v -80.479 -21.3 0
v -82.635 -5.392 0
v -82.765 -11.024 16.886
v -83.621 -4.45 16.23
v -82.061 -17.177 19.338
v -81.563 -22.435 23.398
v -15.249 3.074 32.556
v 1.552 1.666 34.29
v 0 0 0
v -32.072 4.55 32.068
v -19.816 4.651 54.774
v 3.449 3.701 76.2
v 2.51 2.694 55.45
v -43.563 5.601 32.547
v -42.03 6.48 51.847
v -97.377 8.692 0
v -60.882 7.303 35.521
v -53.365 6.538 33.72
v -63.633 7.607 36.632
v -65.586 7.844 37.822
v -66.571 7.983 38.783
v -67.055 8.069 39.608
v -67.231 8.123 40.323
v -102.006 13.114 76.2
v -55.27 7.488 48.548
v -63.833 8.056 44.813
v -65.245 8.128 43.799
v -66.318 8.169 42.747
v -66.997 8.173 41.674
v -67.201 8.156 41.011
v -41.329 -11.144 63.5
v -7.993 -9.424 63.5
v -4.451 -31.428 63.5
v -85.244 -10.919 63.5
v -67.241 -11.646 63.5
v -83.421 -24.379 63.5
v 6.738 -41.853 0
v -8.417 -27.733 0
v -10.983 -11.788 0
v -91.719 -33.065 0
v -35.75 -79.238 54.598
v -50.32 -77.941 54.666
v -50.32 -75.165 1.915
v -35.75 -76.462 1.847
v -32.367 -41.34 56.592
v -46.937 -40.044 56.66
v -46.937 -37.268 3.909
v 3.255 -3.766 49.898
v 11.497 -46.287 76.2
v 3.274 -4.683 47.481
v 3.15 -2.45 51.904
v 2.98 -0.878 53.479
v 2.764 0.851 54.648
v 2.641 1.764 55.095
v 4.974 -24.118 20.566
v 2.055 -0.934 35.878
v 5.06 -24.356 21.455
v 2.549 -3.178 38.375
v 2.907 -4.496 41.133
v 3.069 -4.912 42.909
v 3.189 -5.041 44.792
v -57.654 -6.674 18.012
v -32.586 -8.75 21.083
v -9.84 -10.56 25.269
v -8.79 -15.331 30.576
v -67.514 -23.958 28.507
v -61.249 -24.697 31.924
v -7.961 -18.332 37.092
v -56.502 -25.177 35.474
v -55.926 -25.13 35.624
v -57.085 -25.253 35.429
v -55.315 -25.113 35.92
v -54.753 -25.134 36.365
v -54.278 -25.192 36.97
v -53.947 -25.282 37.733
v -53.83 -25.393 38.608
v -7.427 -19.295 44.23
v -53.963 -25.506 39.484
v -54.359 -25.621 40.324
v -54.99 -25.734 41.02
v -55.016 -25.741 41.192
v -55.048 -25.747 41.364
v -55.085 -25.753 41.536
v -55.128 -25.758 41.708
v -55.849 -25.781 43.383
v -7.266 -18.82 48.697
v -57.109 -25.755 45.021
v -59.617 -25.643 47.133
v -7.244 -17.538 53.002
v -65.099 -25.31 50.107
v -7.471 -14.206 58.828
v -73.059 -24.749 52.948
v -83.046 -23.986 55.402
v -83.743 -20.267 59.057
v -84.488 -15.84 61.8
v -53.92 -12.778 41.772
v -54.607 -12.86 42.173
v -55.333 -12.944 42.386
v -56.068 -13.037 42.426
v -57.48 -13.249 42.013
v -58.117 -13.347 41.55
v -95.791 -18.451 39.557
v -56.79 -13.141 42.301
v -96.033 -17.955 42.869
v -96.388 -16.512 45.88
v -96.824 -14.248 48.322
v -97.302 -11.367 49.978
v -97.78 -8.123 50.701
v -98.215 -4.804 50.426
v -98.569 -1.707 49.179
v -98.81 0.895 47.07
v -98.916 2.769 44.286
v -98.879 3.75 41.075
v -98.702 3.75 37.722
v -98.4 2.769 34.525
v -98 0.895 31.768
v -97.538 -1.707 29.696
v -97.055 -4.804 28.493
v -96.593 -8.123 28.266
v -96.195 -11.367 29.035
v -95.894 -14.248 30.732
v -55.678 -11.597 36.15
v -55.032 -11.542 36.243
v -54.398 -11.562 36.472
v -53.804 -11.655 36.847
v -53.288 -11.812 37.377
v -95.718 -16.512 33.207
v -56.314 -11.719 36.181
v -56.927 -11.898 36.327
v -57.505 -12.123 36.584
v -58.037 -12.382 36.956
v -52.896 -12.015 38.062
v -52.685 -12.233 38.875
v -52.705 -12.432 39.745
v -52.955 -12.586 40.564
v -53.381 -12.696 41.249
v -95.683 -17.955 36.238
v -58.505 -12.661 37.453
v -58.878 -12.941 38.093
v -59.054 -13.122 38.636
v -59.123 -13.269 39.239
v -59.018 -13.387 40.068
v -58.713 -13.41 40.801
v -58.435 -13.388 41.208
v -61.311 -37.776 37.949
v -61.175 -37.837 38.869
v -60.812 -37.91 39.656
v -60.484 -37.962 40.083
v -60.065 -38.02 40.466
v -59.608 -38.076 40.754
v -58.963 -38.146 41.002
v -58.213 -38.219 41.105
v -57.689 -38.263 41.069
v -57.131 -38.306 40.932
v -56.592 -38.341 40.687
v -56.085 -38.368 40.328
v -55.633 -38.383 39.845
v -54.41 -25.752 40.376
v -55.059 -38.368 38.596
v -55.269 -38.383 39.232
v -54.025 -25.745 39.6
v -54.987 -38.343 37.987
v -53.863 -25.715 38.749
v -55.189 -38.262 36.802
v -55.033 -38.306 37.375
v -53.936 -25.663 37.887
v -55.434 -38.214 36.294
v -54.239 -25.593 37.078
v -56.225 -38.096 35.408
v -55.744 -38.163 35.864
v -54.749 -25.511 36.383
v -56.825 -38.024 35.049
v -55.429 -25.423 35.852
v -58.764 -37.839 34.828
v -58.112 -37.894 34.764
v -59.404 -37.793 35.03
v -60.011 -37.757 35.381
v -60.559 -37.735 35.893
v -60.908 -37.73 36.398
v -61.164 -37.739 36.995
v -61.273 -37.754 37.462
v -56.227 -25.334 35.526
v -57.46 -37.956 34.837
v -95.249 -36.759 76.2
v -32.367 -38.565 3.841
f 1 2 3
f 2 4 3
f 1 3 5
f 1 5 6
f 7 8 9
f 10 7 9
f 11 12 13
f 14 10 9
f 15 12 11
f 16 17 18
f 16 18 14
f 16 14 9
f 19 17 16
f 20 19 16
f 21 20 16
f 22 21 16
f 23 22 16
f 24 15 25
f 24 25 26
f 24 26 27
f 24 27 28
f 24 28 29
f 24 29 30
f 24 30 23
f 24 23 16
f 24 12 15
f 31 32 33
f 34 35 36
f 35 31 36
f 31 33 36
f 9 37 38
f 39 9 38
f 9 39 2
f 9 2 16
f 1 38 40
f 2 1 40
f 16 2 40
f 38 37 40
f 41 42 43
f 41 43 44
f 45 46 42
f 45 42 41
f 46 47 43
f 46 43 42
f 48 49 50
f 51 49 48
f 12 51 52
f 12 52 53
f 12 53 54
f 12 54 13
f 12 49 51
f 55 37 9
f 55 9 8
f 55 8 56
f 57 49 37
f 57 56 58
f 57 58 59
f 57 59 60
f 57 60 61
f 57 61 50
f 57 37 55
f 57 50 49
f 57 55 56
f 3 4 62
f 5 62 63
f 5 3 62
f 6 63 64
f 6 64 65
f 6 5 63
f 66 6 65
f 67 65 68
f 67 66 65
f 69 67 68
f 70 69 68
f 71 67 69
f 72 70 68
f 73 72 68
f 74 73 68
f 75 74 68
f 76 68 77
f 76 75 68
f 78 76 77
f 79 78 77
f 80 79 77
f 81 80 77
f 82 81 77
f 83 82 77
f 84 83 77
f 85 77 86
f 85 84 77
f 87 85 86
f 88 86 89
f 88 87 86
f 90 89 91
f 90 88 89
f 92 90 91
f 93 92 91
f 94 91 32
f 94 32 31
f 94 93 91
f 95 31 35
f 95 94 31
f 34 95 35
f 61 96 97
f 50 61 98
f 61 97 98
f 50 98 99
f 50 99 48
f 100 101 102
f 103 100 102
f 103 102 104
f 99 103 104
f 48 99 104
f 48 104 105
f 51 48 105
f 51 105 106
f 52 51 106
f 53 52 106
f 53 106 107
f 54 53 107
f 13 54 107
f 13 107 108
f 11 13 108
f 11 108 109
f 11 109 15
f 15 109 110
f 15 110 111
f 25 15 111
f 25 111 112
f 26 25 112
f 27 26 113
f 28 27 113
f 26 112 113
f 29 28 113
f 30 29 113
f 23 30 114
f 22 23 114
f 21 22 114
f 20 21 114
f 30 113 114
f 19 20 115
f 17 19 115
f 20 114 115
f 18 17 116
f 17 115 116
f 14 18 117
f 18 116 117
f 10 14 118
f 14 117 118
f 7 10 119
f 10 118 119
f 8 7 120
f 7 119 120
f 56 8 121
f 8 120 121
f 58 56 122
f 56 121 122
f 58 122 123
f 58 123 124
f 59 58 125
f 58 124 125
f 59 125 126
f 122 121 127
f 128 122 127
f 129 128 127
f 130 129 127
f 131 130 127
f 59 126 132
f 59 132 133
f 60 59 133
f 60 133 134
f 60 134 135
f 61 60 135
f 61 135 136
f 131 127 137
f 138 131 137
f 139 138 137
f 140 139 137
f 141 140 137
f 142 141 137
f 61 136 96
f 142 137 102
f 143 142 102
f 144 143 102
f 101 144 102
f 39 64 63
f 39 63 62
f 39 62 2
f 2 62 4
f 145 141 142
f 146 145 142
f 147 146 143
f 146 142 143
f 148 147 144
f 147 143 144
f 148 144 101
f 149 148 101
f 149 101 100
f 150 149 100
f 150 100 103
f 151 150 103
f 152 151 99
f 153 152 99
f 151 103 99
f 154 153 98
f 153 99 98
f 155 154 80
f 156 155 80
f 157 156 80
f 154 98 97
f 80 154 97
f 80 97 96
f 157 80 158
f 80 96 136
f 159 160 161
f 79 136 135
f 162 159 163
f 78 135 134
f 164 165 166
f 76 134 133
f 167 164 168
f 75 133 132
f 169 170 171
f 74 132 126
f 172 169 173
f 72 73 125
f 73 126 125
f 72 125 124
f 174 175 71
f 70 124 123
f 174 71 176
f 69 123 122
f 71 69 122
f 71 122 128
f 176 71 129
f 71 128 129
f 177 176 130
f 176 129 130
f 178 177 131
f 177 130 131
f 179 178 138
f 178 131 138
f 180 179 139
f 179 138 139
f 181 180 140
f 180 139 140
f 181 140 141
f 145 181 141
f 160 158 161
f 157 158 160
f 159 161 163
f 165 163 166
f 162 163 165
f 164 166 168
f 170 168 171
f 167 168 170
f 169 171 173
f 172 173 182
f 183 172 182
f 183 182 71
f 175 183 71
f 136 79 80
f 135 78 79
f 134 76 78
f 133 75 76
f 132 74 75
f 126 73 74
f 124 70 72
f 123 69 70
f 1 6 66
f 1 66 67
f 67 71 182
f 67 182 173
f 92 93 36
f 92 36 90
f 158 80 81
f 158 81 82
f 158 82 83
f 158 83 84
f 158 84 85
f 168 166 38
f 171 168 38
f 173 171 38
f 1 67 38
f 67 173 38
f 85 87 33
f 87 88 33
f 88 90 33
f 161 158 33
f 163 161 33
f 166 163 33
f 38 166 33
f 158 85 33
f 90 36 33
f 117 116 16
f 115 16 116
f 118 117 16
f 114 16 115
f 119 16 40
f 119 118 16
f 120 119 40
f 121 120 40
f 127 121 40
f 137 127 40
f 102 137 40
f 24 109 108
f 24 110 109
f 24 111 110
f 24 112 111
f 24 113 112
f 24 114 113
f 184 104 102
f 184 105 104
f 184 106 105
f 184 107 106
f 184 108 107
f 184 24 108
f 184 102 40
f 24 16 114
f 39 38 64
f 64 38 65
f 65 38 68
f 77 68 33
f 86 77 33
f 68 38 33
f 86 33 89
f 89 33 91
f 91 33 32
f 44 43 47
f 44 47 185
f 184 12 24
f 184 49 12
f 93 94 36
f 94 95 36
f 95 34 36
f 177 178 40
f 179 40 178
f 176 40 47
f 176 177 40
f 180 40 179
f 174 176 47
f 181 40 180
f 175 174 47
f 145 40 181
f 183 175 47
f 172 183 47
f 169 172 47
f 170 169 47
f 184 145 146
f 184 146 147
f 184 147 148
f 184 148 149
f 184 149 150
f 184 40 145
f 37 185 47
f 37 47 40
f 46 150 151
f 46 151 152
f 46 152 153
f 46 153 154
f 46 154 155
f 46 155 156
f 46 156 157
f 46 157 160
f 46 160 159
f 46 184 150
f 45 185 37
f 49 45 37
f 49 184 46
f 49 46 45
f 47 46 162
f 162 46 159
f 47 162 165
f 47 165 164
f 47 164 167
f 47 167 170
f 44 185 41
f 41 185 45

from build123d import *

# Parameters (mm, degrees)
F1_DEPTH = 76.2
F1_TAPER = -3
F2_R     = 11.2646539413
F3_DEPTH = 127
F4_T     = -12.7
F5_D     = 6.35
F6_W     = 14.6276317537
F6_H     = 52.8245866299
F8_DEPTH = 38.1


with BuildPart() as f1:
    # F0 (on Top) → F1 (new body)
    with BuildSketch(Plane.XY):
        Polygon((0, 0), (-97.3766073585, 8.691851981), (-91.719087719, -33.0650627753), (6.7379414104, -41.8533533812), align=None)
    extrude(amount=F1_DEPTH, taper=F1_TAPER)

    # F2 (on face) → F3 (cut)
    with BuildSketch(Plane(origin=(-94.2061631176, -12.7637116177, -4.9822445688), x_dir=(0.1338892143, -0.9909710079, 0.0070809466), z_dir=(-0.9895880386, -0.1340763271, -0.0523359562))):
        with Locations((-5.5252215825, 44.5609055459)):
            Circle(F2_R)
    extrude(amount=-F3_DEPTH, mode=Mode.SUBTRACT)

    # F4
    f4_openings = [f1.faces().sort_by_distance(p)[0] for p in [
        (-45.58374, -16.595081, 0),
    ]]
    offset(amount=F4_T, openings=f4_openings)

    # F5 (through all)
    with Locations(Plane(origin=(-3.6430423813, -40.8137538844, -2.1474622433), x_dir=(0.9960508275, -0.088662203, -0.004665063), z_dir=(-0.088784847, -0.9946749211, -0.0523359562))):
        with Locations((-54.7213628888, 39.8817788885)):
            Hole(F5_D / 2)

    # F6 (on face) → F8 (join)
    with BuildSketch(Plane(origin=(-3.6430423813, -40.8137538844, -2.1474622433), x_dir=(0.9960508275, -0.088662203, -0.004665063), z_dir=(-0.088784847, -0.9946749211, -0.0523359562))):
        with Locations((-36.151945591, 32.273888588)):
            Rectangle(F6_W, F6_H)
    extrude(amount=F8_DEPTH)


solid = f1.part
